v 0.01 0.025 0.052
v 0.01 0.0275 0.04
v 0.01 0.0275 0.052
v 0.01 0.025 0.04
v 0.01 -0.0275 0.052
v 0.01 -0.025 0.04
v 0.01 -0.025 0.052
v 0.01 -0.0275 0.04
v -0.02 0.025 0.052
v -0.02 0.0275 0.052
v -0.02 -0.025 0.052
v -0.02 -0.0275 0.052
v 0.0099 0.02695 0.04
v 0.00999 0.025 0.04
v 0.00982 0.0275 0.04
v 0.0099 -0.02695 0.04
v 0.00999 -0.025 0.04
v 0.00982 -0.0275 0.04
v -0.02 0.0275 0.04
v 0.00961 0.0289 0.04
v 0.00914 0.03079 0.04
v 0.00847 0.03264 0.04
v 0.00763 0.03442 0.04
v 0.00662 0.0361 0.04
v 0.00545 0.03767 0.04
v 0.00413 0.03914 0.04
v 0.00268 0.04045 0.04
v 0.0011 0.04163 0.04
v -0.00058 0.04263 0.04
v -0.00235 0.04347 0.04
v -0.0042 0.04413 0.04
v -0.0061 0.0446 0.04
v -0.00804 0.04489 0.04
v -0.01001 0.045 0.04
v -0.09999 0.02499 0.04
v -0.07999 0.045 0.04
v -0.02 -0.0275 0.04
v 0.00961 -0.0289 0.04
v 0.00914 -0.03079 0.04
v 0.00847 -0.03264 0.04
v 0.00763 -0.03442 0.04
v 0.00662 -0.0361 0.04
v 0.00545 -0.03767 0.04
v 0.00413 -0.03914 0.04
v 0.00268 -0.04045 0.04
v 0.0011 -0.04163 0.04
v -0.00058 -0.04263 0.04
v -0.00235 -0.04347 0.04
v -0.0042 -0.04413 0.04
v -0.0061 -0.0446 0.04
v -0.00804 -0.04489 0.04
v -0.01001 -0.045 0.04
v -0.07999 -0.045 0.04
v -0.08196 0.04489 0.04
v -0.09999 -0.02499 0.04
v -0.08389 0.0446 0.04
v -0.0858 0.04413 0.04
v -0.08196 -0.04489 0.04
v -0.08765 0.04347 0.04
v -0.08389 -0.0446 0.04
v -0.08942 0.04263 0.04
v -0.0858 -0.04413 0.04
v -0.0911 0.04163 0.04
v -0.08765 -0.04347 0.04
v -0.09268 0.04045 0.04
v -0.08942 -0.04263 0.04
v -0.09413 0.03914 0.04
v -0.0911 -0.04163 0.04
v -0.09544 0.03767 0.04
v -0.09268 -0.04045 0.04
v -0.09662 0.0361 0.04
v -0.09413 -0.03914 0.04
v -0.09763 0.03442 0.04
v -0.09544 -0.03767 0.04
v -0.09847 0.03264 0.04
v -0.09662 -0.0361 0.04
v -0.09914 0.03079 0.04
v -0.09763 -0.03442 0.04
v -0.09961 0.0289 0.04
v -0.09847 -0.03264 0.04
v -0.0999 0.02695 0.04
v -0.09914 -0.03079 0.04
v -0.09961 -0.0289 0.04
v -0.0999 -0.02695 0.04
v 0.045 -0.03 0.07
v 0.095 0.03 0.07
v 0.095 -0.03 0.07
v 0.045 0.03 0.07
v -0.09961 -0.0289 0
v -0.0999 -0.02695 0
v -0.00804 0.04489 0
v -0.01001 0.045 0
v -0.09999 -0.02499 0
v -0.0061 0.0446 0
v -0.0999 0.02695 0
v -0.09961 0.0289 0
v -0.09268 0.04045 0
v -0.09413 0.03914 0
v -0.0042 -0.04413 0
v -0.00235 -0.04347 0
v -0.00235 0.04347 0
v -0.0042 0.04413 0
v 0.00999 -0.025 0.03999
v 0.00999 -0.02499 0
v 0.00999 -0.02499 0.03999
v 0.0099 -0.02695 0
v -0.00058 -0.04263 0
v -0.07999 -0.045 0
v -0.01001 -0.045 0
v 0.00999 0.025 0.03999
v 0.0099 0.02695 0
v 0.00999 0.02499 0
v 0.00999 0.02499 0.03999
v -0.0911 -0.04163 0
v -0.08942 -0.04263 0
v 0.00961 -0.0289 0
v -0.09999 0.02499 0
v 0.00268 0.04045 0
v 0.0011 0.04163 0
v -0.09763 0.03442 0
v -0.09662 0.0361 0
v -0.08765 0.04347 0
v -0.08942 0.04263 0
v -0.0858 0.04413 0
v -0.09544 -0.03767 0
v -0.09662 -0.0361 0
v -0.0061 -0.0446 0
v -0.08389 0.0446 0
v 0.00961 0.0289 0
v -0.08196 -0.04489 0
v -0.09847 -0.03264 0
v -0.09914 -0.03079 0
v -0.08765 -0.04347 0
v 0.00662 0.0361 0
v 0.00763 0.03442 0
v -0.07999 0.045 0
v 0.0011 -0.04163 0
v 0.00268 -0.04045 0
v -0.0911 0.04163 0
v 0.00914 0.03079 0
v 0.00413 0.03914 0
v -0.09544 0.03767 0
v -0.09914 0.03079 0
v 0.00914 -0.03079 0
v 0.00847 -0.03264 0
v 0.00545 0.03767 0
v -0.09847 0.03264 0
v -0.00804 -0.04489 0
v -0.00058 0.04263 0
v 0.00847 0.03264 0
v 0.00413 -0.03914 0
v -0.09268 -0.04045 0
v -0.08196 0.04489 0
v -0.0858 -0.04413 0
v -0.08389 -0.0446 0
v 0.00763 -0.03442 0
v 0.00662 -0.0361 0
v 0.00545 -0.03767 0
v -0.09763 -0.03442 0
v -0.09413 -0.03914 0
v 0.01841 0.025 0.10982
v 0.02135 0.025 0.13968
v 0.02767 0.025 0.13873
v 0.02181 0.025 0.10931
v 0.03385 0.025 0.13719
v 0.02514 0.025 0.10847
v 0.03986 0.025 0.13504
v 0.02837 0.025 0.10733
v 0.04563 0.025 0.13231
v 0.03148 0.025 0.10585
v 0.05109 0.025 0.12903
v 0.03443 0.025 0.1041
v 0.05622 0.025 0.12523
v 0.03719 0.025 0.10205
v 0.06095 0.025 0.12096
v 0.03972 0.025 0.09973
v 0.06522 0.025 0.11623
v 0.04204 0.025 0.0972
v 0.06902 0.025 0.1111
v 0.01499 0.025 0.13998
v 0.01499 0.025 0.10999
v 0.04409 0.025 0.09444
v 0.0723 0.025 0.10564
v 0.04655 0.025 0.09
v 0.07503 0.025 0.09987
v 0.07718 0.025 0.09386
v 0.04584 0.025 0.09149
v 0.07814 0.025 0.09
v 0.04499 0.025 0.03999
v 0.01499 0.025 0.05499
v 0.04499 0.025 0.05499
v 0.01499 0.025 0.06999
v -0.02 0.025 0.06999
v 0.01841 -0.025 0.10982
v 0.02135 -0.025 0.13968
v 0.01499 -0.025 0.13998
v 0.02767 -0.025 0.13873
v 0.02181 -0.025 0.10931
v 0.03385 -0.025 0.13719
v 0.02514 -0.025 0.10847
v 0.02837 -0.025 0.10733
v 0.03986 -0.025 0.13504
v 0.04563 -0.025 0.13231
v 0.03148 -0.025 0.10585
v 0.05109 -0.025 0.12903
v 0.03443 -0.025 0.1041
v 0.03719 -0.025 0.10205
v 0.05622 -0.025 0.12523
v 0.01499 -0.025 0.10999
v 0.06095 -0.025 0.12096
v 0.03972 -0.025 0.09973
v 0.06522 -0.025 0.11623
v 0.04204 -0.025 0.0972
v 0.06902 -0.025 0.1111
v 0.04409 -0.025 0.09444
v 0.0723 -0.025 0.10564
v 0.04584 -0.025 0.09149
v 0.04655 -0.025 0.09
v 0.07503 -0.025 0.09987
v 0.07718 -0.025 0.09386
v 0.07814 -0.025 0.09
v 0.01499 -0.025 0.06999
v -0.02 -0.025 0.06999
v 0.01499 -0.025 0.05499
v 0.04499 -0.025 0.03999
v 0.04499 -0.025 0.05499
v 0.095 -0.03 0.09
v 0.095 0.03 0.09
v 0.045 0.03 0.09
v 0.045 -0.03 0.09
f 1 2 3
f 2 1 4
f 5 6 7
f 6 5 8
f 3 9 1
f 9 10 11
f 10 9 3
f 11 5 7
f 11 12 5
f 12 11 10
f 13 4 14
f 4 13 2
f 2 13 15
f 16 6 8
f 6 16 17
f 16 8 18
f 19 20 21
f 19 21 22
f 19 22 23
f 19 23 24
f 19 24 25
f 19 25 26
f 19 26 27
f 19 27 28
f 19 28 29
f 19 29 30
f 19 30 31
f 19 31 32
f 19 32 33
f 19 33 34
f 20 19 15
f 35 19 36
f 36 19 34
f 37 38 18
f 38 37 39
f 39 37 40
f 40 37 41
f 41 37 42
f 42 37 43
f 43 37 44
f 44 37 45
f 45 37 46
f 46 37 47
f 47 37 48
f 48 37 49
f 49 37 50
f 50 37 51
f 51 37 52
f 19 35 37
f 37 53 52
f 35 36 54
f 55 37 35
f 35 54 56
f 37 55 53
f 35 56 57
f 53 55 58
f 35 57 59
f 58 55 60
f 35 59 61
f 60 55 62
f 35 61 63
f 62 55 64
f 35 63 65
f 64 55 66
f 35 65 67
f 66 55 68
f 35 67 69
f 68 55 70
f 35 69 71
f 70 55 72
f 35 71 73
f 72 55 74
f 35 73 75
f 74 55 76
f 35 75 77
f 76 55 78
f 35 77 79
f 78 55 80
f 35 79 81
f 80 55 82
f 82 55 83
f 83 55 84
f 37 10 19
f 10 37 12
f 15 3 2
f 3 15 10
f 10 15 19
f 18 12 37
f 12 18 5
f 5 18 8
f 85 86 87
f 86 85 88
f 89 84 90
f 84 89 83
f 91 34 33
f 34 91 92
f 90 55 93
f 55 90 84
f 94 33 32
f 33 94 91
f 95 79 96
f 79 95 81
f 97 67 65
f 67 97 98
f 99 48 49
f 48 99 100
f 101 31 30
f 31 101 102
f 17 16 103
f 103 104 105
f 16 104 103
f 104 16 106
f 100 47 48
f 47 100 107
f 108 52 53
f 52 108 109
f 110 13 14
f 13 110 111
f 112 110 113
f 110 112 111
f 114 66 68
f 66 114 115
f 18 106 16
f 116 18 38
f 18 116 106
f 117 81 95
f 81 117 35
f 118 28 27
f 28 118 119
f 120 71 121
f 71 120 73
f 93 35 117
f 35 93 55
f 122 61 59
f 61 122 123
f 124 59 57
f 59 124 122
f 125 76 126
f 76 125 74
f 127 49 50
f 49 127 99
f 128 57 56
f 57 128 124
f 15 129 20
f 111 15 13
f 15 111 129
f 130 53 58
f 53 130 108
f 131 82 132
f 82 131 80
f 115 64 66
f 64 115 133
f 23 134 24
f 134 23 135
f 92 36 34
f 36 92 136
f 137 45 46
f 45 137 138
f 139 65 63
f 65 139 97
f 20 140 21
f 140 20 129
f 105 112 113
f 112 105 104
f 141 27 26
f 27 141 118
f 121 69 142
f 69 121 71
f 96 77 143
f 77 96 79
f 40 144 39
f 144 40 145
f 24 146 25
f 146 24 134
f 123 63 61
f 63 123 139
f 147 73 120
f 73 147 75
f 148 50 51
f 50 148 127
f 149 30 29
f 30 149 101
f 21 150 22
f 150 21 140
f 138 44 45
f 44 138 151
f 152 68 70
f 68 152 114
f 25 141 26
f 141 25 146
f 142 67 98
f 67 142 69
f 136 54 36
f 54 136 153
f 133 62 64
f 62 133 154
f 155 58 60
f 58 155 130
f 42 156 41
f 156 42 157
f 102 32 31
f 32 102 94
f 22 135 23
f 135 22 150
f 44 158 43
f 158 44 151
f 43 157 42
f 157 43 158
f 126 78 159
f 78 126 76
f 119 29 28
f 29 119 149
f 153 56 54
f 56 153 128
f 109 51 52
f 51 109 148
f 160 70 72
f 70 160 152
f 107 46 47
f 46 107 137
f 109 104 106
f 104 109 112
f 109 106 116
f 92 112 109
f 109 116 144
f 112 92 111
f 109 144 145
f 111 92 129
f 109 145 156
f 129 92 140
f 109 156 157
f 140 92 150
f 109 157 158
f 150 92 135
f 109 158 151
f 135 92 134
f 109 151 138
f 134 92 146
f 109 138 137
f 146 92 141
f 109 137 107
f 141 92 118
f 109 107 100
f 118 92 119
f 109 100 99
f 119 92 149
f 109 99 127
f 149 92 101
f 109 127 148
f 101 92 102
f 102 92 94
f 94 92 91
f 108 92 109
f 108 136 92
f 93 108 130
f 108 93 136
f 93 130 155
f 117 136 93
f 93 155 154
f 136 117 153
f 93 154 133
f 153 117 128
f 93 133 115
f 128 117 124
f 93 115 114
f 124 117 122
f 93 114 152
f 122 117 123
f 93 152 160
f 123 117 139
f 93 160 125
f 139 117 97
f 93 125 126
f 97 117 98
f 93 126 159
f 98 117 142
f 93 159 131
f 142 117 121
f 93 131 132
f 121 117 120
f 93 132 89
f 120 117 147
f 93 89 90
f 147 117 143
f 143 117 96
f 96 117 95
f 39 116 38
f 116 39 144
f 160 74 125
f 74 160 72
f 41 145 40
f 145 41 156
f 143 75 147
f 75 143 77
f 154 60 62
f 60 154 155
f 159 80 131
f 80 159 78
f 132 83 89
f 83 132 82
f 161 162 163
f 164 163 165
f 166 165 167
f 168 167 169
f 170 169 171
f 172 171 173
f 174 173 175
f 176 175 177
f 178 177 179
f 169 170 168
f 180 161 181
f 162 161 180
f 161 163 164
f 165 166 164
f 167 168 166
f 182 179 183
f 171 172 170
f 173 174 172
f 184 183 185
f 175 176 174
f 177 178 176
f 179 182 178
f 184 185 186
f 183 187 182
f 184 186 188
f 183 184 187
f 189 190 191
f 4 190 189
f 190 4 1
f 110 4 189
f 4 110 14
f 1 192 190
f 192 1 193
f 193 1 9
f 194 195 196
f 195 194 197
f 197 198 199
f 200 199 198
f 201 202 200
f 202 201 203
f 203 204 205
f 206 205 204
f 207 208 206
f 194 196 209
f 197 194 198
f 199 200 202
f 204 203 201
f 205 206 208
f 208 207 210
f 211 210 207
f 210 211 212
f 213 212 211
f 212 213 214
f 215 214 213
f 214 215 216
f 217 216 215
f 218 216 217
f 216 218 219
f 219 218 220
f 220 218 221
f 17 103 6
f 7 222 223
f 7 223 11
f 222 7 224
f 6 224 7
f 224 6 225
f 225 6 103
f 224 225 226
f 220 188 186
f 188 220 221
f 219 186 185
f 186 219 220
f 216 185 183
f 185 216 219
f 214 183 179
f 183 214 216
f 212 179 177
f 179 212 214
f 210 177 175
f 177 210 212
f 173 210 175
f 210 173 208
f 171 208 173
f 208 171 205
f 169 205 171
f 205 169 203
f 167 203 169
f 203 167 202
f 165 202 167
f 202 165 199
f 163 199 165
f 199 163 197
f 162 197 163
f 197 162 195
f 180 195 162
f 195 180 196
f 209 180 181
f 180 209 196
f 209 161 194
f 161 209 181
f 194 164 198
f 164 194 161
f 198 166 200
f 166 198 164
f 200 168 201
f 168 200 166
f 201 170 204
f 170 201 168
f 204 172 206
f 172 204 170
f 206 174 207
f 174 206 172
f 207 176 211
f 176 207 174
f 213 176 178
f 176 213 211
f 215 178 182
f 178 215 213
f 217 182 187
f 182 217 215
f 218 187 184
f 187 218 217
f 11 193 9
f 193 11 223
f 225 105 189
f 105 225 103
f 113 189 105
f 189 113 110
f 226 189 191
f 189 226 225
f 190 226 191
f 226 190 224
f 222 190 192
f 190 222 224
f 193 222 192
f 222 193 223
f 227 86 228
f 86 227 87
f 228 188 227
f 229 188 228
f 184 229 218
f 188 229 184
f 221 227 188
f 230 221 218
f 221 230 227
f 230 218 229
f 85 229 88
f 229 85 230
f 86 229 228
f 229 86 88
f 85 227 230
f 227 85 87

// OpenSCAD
$fn=64;

sx = 0.2;
sy = 0.1;
sz = 0.1;

base_len = 0.11;
base_w   = 0.09;
base_h   = 0.04;
base_r   = 0.02;

arm_th   = 0.03;
arm_w    = 0.05;
arm_r    = 0.035;
arm_z0   = base_h;
arm_z1   = 0.09;

pad_len  = 0.05;
pad_w    = 0.06;
pad_h    = 0.02;

boss1_len = 0.03;
boss1_w   = 0.055;
boss1_h   = 0.012;

boss2_len = 0.025;
boss2_w   = 0.055;
boss2_h   = 0.01;

module rounded_rect_2d(l, w, r){
    hull(){
        for(x=[-l/2 + r, l/2 - r])
            for(y=[-w/2 + r, w/2 - r])
                translate([x,y]) circle(r=r);
    }
}

module rounded_block(l,w,h,r){
    linear_extrude(height=h)
        rounded_rect_2d(l,w,r);
}

module arm_path_2d(r, z0, z1){
    union(){
        translate([0, z0]) square([r, arm_th], center=false);
        translate([r, z0]) square([arm_th, (z1 - z0) - r], center=false);
        translate([r, z0 + r]) intersection(){
            circle(r=r + arm_th);
            difference(){
                square([r + arm_th, r + arm_th], center=false);
                circle(r=r);
            }
        }
    }
}

module arm_solid(){
    translate([base_len/2 - arm_th, 0, 0])
        rotate([90,0,0])
            linear_extrude(height=arm_w, center=true)
                arm_path_2d(arm_r, arm_z0, arm_z1);
}

module end_pad(){
    x_end = (base_len/2 - arm_th) + arm_r + arm_th + pad_len/2;
    z_end = arm_z1 - pad_h/2;
    translate([x_end, 0, z_end])
        cube([pad_len, pad_w, pad_h], center=true);
}

module bosses(){
    x_b1 = base_len/2 - boss1_len/2;
    z_b1 = base_h + boss1_h/2;
    translate([x_b1, 0, z_b1])
        cube([boss1_len, boss1_w, boss1_h], center=true);

    x_end = (base_len/2 - arm_th) + arm_r + arm_th + pad_len/2;
    x_b2 = x_end - pad_len/2 + boss2_len/2;
    z_b2 = arm_z1 - pad_h + boss2_h/2;
    translate([x_b2, 0, z_b2])
        cube([boss2_len, boss2_w, boss2_h], center=true);
}

module bracket(){
    union(){
        translate([-(sx/2) + base_len/2, 0, 0])
            rounded_block(base_len, base_w, base_h, base_r);

        translate([-(sx/2) + base_len/2, 0, 0])
            arm_solid();

        translate([-(sx/2) + base_len/2, 0, 0])
            end_pad();

        translate([-(sx/2) + base_len/2, 0, 0])
            bosses();
    }
}

bracket();
